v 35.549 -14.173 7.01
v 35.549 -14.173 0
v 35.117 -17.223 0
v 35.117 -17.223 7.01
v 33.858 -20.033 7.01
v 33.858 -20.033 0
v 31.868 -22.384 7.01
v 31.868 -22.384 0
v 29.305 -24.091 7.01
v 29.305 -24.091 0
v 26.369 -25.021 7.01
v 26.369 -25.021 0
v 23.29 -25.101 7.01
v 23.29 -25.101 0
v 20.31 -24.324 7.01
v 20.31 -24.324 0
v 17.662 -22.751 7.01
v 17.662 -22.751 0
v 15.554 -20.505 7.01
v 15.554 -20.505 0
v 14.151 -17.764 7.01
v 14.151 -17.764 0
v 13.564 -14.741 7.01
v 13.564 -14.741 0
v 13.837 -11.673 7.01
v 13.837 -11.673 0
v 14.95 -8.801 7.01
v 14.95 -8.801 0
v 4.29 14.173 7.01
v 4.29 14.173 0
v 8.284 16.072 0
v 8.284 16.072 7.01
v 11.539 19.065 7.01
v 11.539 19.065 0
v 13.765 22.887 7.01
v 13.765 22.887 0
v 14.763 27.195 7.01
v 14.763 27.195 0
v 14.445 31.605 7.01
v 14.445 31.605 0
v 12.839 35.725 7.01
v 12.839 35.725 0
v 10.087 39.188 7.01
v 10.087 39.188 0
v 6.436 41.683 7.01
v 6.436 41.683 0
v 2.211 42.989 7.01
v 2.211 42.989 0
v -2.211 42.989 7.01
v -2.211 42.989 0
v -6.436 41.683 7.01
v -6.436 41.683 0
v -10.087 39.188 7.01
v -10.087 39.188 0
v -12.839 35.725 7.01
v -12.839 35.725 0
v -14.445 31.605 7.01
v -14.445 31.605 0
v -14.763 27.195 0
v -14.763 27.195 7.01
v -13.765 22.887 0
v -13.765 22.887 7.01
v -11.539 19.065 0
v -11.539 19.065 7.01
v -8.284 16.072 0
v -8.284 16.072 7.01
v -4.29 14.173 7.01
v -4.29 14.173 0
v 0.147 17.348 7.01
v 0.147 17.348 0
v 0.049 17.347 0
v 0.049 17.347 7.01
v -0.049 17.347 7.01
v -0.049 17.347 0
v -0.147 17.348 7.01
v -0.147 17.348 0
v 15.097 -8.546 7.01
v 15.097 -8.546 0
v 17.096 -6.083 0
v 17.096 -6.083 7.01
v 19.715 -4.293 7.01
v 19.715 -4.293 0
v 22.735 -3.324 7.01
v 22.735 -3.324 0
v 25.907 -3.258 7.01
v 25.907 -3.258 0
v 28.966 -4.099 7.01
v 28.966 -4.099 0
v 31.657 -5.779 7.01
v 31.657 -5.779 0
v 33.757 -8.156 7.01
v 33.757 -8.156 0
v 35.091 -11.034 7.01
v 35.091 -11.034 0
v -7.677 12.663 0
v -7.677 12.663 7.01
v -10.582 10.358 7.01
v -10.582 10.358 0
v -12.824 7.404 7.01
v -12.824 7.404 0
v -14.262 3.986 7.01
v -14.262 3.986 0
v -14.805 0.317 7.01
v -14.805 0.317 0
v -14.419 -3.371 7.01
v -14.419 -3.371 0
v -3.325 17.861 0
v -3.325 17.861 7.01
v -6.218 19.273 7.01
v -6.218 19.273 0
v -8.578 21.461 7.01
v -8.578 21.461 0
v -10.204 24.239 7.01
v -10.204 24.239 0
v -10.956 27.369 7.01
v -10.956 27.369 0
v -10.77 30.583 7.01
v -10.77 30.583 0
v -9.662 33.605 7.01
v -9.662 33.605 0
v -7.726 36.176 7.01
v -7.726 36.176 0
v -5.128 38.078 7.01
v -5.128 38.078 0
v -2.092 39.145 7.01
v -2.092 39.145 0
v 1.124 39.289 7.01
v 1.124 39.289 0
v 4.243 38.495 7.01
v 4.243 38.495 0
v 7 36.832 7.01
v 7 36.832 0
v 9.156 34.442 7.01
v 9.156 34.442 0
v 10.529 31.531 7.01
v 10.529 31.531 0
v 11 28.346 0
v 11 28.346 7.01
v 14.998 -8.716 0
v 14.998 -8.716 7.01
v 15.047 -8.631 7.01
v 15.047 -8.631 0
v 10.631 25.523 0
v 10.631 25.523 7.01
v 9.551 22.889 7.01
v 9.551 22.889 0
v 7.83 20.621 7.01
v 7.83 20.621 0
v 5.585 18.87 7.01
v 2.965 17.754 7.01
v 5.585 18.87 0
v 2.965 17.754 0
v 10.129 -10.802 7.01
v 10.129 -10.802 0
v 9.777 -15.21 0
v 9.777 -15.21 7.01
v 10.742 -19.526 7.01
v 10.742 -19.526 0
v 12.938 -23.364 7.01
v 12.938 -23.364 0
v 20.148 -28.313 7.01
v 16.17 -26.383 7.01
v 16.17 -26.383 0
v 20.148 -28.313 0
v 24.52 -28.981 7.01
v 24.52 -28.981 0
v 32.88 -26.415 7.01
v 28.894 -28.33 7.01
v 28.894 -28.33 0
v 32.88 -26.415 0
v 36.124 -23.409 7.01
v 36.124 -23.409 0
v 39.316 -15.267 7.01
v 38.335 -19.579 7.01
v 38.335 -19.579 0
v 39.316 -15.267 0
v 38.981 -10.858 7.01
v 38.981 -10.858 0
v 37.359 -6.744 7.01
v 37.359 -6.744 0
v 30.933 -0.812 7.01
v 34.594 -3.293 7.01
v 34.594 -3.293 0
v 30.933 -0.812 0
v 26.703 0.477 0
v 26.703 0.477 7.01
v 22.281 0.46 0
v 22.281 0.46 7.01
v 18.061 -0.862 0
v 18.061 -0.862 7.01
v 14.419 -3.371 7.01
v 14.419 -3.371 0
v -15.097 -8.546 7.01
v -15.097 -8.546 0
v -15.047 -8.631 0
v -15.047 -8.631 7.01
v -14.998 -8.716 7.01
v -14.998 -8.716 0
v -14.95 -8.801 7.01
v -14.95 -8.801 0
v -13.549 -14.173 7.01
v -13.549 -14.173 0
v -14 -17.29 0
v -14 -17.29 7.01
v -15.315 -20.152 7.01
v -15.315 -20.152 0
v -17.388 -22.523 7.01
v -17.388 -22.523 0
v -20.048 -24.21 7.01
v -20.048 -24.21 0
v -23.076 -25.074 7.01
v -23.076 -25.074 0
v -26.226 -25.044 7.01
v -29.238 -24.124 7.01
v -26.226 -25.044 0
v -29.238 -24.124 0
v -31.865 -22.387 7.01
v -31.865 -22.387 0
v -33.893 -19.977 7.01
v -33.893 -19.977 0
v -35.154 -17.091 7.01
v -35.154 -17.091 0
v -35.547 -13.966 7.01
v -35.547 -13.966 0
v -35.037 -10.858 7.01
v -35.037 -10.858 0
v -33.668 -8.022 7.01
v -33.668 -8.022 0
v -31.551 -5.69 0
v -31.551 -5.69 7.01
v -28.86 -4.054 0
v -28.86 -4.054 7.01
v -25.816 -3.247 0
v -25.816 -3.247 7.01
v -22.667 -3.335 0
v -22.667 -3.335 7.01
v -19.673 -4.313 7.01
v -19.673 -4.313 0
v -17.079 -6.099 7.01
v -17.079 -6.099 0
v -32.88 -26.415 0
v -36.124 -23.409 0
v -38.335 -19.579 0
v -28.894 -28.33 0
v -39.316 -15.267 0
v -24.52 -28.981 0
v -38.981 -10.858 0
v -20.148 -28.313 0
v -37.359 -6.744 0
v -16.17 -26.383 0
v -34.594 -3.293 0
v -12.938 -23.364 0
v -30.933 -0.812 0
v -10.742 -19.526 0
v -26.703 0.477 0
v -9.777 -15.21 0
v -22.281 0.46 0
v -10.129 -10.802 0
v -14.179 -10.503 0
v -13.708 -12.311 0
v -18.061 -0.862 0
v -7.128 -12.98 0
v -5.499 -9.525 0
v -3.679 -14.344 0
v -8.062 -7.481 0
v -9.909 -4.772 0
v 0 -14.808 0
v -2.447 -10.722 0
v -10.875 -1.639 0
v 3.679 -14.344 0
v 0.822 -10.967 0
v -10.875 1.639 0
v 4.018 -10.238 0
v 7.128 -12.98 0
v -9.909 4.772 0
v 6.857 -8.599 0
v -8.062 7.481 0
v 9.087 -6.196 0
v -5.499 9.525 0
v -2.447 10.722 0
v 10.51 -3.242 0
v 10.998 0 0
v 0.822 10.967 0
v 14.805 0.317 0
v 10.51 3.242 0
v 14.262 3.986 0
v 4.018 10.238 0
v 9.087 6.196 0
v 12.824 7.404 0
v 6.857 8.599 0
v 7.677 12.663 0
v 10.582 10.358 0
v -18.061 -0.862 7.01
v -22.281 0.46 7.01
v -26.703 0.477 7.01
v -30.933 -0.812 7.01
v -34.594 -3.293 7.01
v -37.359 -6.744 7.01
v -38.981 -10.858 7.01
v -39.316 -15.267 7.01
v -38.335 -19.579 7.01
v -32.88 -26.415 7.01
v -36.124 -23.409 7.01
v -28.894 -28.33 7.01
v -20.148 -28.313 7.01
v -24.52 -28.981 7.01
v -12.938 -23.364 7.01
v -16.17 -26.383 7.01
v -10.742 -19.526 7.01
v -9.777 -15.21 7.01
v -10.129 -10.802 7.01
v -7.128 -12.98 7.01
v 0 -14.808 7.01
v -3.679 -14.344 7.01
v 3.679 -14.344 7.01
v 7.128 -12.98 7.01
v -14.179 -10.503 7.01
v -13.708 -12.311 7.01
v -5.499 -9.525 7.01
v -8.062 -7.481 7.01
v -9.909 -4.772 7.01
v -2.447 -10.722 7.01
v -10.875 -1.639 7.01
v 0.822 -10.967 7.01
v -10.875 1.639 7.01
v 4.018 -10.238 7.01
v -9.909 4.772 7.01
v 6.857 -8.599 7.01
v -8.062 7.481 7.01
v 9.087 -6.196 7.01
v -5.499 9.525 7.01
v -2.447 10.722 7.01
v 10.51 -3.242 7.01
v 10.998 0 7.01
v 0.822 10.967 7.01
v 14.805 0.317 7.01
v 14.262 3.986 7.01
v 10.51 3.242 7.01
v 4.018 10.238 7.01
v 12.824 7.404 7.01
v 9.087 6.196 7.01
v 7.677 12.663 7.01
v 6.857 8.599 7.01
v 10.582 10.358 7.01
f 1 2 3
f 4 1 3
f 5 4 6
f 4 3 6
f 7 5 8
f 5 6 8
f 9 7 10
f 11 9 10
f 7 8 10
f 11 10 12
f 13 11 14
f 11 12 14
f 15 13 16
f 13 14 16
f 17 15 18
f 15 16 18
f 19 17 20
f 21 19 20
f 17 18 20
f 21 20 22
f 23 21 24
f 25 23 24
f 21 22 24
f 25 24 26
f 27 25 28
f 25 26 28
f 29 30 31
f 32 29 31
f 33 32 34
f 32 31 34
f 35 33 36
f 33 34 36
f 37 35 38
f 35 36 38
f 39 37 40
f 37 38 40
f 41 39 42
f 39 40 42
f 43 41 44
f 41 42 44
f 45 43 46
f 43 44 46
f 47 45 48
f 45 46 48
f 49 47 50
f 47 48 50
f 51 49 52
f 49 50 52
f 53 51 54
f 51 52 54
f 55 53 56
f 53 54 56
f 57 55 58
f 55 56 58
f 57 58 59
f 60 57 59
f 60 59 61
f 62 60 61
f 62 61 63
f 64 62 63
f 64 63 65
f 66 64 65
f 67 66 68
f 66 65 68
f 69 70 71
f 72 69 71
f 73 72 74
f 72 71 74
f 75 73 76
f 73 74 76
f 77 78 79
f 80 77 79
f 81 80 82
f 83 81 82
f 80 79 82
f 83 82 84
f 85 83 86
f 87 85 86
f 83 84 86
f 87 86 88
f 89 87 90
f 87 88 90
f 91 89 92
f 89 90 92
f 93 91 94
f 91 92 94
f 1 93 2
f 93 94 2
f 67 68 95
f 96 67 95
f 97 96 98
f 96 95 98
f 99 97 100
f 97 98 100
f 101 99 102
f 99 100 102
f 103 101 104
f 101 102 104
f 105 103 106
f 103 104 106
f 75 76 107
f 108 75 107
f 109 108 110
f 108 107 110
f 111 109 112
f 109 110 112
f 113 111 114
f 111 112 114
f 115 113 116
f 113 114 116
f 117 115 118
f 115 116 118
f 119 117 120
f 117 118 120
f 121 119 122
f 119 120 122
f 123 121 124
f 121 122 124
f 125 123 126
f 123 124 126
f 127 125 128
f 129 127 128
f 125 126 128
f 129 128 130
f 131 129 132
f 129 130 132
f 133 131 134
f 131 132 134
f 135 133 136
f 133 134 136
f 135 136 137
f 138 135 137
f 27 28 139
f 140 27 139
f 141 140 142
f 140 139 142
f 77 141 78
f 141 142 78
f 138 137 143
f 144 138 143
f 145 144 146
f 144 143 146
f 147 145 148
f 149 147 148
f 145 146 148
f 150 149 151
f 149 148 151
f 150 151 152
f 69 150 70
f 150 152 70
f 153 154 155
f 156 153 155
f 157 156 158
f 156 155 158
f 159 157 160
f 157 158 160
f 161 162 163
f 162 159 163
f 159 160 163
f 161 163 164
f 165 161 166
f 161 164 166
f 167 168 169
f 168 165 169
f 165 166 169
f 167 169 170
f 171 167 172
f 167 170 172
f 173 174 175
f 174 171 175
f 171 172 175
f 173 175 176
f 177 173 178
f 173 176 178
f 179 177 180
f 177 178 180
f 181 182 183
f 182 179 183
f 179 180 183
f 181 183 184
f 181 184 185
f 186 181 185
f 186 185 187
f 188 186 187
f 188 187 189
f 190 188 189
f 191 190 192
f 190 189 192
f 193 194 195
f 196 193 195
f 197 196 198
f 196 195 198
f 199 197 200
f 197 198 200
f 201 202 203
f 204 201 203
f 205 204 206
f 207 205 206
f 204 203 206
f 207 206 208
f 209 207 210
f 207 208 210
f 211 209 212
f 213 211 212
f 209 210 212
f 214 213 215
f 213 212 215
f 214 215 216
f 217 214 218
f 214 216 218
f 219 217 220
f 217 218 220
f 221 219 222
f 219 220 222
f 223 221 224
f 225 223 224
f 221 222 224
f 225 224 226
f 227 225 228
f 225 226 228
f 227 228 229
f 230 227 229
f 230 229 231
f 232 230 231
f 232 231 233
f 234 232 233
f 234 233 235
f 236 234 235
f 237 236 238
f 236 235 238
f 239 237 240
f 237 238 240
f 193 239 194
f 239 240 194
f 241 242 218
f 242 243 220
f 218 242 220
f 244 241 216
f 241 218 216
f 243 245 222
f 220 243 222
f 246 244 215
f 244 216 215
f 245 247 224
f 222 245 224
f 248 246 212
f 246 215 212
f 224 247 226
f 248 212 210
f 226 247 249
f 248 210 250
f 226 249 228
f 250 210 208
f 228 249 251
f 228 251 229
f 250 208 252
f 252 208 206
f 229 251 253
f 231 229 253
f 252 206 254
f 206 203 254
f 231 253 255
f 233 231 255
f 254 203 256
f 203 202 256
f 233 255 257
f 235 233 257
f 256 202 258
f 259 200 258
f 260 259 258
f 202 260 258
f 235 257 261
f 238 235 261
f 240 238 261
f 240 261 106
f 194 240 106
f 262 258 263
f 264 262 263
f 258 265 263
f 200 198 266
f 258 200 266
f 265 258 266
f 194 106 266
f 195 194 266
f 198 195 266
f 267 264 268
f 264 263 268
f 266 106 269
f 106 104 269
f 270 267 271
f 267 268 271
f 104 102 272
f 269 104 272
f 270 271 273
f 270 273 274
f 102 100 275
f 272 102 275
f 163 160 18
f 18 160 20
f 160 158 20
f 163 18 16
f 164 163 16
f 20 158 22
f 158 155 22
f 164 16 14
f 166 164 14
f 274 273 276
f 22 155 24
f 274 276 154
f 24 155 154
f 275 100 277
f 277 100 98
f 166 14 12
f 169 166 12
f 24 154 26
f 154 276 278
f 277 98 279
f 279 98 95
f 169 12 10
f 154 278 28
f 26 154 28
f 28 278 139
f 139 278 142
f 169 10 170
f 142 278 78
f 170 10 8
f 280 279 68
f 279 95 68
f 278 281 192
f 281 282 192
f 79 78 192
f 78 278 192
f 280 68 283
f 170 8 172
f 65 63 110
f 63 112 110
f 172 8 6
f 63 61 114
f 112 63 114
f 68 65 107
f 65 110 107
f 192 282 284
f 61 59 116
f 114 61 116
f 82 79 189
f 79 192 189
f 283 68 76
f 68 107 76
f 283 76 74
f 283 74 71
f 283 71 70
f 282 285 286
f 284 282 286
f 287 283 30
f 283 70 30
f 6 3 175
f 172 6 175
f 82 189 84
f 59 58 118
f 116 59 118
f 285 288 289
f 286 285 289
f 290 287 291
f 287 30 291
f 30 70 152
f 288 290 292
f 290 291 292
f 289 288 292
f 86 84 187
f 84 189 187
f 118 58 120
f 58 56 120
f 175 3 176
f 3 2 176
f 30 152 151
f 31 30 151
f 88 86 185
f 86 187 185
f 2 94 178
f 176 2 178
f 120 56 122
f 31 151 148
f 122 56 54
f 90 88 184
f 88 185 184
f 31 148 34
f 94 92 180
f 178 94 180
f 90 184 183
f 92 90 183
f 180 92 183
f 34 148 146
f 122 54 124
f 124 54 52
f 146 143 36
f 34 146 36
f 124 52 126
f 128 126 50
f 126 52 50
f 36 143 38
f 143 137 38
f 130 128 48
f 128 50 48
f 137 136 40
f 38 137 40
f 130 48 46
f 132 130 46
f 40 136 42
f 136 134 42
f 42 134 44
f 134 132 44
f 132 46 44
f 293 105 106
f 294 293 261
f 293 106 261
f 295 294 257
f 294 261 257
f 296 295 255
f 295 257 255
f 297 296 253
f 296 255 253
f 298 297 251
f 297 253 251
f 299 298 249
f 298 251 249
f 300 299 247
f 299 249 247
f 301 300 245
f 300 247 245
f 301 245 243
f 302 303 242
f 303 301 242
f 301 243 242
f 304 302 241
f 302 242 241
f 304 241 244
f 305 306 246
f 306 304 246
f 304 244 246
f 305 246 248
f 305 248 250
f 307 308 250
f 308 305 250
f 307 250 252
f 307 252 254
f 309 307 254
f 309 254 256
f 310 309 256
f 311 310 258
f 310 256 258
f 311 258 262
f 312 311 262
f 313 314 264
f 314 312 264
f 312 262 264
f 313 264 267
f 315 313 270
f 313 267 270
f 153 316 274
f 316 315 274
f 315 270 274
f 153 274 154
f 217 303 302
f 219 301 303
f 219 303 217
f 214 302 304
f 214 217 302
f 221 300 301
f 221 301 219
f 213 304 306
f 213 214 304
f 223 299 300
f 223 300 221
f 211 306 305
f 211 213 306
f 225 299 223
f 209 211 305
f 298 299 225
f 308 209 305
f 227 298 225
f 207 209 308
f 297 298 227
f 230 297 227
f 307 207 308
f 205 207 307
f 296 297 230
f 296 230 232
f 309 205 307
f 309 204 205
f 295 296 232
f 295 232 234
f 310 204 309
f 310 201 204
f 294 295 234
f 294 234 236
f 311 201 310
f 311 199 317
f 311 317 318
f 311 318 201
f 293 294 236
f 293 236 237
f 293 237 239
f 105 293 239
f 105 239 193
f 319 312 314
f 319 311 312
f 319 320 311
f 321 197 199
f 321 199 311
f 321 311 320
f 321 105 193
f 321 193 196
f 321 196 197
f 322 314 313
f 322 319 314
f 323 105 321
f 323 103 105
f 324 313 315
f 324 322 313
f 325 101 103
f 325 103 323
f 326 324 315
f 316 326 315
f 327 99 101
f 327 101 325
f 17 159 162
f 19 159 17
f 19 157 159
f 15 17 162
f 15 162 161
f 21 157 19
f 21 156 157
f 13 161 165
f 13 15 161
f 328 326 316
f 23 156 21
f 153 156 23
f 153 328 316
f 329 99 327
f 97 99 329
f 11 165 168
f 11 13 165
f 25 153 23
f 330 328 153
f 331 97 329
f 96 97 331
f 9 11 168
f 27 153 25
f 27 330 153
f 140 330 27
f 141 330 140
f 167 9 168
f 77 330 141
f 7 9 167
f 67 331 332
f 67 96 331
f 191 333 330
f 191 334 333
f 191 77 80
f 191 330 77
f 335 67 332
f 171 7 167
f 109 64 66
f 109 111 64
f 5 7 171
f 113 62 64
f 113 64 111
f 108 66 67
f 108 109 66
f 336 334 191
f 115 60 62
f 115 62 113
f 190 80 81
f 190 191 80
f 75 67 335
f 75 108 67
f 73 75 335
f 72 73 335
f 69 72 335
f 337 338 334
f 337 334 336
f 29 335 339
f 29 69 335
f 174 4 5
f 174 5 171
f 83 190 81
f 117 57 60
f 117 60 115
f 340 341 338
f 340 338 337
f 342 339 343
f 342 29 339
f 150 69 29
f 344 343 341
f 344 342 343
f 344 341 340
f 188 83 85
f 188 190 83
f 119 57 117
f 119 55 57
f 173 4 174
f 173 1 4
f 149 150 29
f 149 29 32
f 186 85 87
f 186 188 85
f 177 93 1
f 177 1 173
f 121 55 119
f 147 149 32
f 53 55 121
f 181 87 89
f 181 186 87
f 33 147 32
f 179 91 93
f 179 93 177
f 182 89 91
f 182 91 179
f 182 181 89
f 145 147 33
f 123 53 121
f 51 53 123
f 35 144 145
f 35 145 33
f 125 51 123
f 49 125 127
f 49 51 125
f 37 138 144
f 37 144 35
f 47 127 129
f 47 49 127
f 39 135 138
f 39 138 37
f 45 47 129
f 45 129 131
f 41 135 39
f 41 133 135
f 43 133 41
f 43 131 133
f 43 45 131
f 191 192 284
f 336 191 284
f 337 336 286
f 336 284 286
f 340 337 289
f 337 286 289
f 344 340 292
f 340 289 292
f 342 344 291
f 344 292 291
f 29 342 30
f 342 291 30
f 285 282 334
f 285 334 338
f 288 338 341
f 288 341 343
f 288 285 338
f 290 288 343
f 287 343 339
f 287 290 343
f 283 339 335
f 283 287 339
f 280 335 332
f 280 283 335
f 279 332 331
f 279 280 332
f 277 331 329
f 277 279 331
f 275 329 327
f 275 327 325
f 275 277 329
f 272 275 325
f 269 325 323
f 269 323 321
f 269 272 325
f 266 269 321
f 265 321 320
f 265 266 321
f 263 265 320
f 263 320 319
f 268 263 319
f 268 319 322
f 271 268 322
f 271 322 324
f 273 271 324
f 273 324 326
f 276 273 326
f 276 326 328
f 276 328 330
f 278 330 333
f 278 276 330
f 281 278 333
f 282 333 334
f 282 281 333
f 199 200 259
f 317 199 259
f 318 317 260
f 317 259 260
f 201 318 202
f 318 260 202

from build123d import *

# Parameters (mm, degrees)
F0_R     = 10.9982
F1_DEPTH = 7.0104
F4_DEPTH = 25.146


# Not quite as in the source:
# - a feature of the source that left no trace in its solid (it failed there, or was rolled back) is left out


with BuildPart() as f1:
    # F0 (on Top) → F1 (new body)
    with BuildSketch(Plane.XY):
        with BuildLine():
            ThreePointArc((17.2763619736, 1.5771367083), (15.0239819099, 8.6741), (10.0040214414, 14.1732))
            ThreePointArc((10.0040214414, 14.1732), (0, 45.6946), (-10.0040214414, 14.1732))
            ThreePointArc((-10.0040214414, 14.1732), (-15.0239819099, 8.6741), (-17.2763619736, 1.5771367083))
            ThreePointArc((-17.2763619736, 1.5771367083), (-39.5726844158, -22.8473), (-7.2723405322, -15.7503367083))
            ThreePointArc((-7.2723405322, -15.7503367083), (0, -17.3482), (7.2723405322, -15.7503367083))
            ThreePointArc((7.2723405322, -15.7503367083), (39.5726844158, -22.8473), (17.2763619736, 1.5771367083))
        make_face()
        with BuildLine():
            ThreePointArc((-13.5488898986, -14.1732), (-35.1543992189, -17.0912600791), (-15.0971116601, -8.5461841053))
            ThreePointArc((-15.0971116601, -8.5461841053), (-15.0225853511, -8.6732936964), (-14.9497683707, -8.8013901688))
            ThreePointArc((-14.9497683707, -8.8013901688), (-13.904869688, -11.3974658018), (-13.5488898986, -14.1732))
        make_face(mode=Mode.SUBTRACT)
        with BuildLine():
            ThreePointArc((15.0971116601, -8.5461841053), (27.466762585, -3.567503287), (35.5485151131, -14.1732))
            ThreePointArc((35.5485151131, -14.1732), (21.7729683076, -24.8170328179), (14.9497683707, -8.8013901688))
            ThreePointArc((14.9497683707, -8.8013901688), (15.0225853511, -8.6732936964), (15.0971116601, -8.5461841053))
        make_face(mode=Mode.SUBTRACT)
        Circle(F0_R, mode=Mode.SUBTRACT)
        with BuildLine():
            ThreePointArc((-0.1473432894, 17.3475742741), (-7.7257727387, 36.1763625148), (10.9998126072, 28.3464))
            ThreePointArc((10.9998126072, 28.3464), (7.8299625148, 20.6206272613), (0.1473432894, 17.3475742741))
            ThreePointArc((0.1473432894, 17.3475742741), (0, 17.3465873928), (-0.1473432894, 17.3475742741))
        make_face(mode=Mode.SUBTRACT)
    extrude(amount=F1_DEPTH)

    # F3 (on face) → F4 (cut)
    with BuildSketch(Plane(origin=(0, 0, 0), x_dir=(1, 0, 0), z_dir=(0, 0, -1))):
        with BuildLine():
            ThreePointArc((-10.0040214414, -14.1732), (0, -45.6946), (10.0040214414, -14.1732))
            ThreePointArc((10.0040214414, -14.1732), (15.0239819099, -8.6741), (17.2763619736, -1.5771367083))
            ThreePointArc((17.2763619736, -1.5771367083), (39.5726844158, 22.8473), (7.2723405322, 15.7503367083))
            ThreePointArc((7.2723405322, 15.7503367083), (0, 17.3482), (-7.2723405322, 15.7503367083))
            ThreePointArc((-7.2723405322, 15.7503367083), (-39.5726844158, 22.8473), (-17.2763619736, -1.5771367083))
            ThreePointArc((-17.2763619736, -1.5771367083), (-15.0239819099, -8.6741), (-10.0040214414, -14.1732))
        make_face()
        with BuildLine():
            ThreePointArc((10.1294026029, 10.8017600414), (37.3729807628, 21.5773005039), (14.4192999029, 3.3714399586))
            ThreePointArc((14.4192999029, 3.3714399586), (12.824278257, -7.4041005038), (4.2898973, -14.1732))
            ThreePointArc((4.2898973, -14.1732), (0, -43.1546010077), (-4.2898973, -14.1732))
            ThreePointArc((-4.2898973, -14.1732), (-12.824278257, -7.4041005038), (-14.4192999029, 3.3714399586))
            ThreePointArc((-14.4192999029, 3.3714399586), (-37.3729807628, 21.5773005038), (-10.1294026029, 10.8017600414))
            ThreePointArc((-10.1294026029, 10.8017600414), (0, 14.8082010077), (10.1294026029, 10.8017600414))
        make_face(mode=Mode.SUBTRACT)
    extrude(amount=-F4_DEPTH, mode=Mode.SUBTRACT)


solid = f1.part
